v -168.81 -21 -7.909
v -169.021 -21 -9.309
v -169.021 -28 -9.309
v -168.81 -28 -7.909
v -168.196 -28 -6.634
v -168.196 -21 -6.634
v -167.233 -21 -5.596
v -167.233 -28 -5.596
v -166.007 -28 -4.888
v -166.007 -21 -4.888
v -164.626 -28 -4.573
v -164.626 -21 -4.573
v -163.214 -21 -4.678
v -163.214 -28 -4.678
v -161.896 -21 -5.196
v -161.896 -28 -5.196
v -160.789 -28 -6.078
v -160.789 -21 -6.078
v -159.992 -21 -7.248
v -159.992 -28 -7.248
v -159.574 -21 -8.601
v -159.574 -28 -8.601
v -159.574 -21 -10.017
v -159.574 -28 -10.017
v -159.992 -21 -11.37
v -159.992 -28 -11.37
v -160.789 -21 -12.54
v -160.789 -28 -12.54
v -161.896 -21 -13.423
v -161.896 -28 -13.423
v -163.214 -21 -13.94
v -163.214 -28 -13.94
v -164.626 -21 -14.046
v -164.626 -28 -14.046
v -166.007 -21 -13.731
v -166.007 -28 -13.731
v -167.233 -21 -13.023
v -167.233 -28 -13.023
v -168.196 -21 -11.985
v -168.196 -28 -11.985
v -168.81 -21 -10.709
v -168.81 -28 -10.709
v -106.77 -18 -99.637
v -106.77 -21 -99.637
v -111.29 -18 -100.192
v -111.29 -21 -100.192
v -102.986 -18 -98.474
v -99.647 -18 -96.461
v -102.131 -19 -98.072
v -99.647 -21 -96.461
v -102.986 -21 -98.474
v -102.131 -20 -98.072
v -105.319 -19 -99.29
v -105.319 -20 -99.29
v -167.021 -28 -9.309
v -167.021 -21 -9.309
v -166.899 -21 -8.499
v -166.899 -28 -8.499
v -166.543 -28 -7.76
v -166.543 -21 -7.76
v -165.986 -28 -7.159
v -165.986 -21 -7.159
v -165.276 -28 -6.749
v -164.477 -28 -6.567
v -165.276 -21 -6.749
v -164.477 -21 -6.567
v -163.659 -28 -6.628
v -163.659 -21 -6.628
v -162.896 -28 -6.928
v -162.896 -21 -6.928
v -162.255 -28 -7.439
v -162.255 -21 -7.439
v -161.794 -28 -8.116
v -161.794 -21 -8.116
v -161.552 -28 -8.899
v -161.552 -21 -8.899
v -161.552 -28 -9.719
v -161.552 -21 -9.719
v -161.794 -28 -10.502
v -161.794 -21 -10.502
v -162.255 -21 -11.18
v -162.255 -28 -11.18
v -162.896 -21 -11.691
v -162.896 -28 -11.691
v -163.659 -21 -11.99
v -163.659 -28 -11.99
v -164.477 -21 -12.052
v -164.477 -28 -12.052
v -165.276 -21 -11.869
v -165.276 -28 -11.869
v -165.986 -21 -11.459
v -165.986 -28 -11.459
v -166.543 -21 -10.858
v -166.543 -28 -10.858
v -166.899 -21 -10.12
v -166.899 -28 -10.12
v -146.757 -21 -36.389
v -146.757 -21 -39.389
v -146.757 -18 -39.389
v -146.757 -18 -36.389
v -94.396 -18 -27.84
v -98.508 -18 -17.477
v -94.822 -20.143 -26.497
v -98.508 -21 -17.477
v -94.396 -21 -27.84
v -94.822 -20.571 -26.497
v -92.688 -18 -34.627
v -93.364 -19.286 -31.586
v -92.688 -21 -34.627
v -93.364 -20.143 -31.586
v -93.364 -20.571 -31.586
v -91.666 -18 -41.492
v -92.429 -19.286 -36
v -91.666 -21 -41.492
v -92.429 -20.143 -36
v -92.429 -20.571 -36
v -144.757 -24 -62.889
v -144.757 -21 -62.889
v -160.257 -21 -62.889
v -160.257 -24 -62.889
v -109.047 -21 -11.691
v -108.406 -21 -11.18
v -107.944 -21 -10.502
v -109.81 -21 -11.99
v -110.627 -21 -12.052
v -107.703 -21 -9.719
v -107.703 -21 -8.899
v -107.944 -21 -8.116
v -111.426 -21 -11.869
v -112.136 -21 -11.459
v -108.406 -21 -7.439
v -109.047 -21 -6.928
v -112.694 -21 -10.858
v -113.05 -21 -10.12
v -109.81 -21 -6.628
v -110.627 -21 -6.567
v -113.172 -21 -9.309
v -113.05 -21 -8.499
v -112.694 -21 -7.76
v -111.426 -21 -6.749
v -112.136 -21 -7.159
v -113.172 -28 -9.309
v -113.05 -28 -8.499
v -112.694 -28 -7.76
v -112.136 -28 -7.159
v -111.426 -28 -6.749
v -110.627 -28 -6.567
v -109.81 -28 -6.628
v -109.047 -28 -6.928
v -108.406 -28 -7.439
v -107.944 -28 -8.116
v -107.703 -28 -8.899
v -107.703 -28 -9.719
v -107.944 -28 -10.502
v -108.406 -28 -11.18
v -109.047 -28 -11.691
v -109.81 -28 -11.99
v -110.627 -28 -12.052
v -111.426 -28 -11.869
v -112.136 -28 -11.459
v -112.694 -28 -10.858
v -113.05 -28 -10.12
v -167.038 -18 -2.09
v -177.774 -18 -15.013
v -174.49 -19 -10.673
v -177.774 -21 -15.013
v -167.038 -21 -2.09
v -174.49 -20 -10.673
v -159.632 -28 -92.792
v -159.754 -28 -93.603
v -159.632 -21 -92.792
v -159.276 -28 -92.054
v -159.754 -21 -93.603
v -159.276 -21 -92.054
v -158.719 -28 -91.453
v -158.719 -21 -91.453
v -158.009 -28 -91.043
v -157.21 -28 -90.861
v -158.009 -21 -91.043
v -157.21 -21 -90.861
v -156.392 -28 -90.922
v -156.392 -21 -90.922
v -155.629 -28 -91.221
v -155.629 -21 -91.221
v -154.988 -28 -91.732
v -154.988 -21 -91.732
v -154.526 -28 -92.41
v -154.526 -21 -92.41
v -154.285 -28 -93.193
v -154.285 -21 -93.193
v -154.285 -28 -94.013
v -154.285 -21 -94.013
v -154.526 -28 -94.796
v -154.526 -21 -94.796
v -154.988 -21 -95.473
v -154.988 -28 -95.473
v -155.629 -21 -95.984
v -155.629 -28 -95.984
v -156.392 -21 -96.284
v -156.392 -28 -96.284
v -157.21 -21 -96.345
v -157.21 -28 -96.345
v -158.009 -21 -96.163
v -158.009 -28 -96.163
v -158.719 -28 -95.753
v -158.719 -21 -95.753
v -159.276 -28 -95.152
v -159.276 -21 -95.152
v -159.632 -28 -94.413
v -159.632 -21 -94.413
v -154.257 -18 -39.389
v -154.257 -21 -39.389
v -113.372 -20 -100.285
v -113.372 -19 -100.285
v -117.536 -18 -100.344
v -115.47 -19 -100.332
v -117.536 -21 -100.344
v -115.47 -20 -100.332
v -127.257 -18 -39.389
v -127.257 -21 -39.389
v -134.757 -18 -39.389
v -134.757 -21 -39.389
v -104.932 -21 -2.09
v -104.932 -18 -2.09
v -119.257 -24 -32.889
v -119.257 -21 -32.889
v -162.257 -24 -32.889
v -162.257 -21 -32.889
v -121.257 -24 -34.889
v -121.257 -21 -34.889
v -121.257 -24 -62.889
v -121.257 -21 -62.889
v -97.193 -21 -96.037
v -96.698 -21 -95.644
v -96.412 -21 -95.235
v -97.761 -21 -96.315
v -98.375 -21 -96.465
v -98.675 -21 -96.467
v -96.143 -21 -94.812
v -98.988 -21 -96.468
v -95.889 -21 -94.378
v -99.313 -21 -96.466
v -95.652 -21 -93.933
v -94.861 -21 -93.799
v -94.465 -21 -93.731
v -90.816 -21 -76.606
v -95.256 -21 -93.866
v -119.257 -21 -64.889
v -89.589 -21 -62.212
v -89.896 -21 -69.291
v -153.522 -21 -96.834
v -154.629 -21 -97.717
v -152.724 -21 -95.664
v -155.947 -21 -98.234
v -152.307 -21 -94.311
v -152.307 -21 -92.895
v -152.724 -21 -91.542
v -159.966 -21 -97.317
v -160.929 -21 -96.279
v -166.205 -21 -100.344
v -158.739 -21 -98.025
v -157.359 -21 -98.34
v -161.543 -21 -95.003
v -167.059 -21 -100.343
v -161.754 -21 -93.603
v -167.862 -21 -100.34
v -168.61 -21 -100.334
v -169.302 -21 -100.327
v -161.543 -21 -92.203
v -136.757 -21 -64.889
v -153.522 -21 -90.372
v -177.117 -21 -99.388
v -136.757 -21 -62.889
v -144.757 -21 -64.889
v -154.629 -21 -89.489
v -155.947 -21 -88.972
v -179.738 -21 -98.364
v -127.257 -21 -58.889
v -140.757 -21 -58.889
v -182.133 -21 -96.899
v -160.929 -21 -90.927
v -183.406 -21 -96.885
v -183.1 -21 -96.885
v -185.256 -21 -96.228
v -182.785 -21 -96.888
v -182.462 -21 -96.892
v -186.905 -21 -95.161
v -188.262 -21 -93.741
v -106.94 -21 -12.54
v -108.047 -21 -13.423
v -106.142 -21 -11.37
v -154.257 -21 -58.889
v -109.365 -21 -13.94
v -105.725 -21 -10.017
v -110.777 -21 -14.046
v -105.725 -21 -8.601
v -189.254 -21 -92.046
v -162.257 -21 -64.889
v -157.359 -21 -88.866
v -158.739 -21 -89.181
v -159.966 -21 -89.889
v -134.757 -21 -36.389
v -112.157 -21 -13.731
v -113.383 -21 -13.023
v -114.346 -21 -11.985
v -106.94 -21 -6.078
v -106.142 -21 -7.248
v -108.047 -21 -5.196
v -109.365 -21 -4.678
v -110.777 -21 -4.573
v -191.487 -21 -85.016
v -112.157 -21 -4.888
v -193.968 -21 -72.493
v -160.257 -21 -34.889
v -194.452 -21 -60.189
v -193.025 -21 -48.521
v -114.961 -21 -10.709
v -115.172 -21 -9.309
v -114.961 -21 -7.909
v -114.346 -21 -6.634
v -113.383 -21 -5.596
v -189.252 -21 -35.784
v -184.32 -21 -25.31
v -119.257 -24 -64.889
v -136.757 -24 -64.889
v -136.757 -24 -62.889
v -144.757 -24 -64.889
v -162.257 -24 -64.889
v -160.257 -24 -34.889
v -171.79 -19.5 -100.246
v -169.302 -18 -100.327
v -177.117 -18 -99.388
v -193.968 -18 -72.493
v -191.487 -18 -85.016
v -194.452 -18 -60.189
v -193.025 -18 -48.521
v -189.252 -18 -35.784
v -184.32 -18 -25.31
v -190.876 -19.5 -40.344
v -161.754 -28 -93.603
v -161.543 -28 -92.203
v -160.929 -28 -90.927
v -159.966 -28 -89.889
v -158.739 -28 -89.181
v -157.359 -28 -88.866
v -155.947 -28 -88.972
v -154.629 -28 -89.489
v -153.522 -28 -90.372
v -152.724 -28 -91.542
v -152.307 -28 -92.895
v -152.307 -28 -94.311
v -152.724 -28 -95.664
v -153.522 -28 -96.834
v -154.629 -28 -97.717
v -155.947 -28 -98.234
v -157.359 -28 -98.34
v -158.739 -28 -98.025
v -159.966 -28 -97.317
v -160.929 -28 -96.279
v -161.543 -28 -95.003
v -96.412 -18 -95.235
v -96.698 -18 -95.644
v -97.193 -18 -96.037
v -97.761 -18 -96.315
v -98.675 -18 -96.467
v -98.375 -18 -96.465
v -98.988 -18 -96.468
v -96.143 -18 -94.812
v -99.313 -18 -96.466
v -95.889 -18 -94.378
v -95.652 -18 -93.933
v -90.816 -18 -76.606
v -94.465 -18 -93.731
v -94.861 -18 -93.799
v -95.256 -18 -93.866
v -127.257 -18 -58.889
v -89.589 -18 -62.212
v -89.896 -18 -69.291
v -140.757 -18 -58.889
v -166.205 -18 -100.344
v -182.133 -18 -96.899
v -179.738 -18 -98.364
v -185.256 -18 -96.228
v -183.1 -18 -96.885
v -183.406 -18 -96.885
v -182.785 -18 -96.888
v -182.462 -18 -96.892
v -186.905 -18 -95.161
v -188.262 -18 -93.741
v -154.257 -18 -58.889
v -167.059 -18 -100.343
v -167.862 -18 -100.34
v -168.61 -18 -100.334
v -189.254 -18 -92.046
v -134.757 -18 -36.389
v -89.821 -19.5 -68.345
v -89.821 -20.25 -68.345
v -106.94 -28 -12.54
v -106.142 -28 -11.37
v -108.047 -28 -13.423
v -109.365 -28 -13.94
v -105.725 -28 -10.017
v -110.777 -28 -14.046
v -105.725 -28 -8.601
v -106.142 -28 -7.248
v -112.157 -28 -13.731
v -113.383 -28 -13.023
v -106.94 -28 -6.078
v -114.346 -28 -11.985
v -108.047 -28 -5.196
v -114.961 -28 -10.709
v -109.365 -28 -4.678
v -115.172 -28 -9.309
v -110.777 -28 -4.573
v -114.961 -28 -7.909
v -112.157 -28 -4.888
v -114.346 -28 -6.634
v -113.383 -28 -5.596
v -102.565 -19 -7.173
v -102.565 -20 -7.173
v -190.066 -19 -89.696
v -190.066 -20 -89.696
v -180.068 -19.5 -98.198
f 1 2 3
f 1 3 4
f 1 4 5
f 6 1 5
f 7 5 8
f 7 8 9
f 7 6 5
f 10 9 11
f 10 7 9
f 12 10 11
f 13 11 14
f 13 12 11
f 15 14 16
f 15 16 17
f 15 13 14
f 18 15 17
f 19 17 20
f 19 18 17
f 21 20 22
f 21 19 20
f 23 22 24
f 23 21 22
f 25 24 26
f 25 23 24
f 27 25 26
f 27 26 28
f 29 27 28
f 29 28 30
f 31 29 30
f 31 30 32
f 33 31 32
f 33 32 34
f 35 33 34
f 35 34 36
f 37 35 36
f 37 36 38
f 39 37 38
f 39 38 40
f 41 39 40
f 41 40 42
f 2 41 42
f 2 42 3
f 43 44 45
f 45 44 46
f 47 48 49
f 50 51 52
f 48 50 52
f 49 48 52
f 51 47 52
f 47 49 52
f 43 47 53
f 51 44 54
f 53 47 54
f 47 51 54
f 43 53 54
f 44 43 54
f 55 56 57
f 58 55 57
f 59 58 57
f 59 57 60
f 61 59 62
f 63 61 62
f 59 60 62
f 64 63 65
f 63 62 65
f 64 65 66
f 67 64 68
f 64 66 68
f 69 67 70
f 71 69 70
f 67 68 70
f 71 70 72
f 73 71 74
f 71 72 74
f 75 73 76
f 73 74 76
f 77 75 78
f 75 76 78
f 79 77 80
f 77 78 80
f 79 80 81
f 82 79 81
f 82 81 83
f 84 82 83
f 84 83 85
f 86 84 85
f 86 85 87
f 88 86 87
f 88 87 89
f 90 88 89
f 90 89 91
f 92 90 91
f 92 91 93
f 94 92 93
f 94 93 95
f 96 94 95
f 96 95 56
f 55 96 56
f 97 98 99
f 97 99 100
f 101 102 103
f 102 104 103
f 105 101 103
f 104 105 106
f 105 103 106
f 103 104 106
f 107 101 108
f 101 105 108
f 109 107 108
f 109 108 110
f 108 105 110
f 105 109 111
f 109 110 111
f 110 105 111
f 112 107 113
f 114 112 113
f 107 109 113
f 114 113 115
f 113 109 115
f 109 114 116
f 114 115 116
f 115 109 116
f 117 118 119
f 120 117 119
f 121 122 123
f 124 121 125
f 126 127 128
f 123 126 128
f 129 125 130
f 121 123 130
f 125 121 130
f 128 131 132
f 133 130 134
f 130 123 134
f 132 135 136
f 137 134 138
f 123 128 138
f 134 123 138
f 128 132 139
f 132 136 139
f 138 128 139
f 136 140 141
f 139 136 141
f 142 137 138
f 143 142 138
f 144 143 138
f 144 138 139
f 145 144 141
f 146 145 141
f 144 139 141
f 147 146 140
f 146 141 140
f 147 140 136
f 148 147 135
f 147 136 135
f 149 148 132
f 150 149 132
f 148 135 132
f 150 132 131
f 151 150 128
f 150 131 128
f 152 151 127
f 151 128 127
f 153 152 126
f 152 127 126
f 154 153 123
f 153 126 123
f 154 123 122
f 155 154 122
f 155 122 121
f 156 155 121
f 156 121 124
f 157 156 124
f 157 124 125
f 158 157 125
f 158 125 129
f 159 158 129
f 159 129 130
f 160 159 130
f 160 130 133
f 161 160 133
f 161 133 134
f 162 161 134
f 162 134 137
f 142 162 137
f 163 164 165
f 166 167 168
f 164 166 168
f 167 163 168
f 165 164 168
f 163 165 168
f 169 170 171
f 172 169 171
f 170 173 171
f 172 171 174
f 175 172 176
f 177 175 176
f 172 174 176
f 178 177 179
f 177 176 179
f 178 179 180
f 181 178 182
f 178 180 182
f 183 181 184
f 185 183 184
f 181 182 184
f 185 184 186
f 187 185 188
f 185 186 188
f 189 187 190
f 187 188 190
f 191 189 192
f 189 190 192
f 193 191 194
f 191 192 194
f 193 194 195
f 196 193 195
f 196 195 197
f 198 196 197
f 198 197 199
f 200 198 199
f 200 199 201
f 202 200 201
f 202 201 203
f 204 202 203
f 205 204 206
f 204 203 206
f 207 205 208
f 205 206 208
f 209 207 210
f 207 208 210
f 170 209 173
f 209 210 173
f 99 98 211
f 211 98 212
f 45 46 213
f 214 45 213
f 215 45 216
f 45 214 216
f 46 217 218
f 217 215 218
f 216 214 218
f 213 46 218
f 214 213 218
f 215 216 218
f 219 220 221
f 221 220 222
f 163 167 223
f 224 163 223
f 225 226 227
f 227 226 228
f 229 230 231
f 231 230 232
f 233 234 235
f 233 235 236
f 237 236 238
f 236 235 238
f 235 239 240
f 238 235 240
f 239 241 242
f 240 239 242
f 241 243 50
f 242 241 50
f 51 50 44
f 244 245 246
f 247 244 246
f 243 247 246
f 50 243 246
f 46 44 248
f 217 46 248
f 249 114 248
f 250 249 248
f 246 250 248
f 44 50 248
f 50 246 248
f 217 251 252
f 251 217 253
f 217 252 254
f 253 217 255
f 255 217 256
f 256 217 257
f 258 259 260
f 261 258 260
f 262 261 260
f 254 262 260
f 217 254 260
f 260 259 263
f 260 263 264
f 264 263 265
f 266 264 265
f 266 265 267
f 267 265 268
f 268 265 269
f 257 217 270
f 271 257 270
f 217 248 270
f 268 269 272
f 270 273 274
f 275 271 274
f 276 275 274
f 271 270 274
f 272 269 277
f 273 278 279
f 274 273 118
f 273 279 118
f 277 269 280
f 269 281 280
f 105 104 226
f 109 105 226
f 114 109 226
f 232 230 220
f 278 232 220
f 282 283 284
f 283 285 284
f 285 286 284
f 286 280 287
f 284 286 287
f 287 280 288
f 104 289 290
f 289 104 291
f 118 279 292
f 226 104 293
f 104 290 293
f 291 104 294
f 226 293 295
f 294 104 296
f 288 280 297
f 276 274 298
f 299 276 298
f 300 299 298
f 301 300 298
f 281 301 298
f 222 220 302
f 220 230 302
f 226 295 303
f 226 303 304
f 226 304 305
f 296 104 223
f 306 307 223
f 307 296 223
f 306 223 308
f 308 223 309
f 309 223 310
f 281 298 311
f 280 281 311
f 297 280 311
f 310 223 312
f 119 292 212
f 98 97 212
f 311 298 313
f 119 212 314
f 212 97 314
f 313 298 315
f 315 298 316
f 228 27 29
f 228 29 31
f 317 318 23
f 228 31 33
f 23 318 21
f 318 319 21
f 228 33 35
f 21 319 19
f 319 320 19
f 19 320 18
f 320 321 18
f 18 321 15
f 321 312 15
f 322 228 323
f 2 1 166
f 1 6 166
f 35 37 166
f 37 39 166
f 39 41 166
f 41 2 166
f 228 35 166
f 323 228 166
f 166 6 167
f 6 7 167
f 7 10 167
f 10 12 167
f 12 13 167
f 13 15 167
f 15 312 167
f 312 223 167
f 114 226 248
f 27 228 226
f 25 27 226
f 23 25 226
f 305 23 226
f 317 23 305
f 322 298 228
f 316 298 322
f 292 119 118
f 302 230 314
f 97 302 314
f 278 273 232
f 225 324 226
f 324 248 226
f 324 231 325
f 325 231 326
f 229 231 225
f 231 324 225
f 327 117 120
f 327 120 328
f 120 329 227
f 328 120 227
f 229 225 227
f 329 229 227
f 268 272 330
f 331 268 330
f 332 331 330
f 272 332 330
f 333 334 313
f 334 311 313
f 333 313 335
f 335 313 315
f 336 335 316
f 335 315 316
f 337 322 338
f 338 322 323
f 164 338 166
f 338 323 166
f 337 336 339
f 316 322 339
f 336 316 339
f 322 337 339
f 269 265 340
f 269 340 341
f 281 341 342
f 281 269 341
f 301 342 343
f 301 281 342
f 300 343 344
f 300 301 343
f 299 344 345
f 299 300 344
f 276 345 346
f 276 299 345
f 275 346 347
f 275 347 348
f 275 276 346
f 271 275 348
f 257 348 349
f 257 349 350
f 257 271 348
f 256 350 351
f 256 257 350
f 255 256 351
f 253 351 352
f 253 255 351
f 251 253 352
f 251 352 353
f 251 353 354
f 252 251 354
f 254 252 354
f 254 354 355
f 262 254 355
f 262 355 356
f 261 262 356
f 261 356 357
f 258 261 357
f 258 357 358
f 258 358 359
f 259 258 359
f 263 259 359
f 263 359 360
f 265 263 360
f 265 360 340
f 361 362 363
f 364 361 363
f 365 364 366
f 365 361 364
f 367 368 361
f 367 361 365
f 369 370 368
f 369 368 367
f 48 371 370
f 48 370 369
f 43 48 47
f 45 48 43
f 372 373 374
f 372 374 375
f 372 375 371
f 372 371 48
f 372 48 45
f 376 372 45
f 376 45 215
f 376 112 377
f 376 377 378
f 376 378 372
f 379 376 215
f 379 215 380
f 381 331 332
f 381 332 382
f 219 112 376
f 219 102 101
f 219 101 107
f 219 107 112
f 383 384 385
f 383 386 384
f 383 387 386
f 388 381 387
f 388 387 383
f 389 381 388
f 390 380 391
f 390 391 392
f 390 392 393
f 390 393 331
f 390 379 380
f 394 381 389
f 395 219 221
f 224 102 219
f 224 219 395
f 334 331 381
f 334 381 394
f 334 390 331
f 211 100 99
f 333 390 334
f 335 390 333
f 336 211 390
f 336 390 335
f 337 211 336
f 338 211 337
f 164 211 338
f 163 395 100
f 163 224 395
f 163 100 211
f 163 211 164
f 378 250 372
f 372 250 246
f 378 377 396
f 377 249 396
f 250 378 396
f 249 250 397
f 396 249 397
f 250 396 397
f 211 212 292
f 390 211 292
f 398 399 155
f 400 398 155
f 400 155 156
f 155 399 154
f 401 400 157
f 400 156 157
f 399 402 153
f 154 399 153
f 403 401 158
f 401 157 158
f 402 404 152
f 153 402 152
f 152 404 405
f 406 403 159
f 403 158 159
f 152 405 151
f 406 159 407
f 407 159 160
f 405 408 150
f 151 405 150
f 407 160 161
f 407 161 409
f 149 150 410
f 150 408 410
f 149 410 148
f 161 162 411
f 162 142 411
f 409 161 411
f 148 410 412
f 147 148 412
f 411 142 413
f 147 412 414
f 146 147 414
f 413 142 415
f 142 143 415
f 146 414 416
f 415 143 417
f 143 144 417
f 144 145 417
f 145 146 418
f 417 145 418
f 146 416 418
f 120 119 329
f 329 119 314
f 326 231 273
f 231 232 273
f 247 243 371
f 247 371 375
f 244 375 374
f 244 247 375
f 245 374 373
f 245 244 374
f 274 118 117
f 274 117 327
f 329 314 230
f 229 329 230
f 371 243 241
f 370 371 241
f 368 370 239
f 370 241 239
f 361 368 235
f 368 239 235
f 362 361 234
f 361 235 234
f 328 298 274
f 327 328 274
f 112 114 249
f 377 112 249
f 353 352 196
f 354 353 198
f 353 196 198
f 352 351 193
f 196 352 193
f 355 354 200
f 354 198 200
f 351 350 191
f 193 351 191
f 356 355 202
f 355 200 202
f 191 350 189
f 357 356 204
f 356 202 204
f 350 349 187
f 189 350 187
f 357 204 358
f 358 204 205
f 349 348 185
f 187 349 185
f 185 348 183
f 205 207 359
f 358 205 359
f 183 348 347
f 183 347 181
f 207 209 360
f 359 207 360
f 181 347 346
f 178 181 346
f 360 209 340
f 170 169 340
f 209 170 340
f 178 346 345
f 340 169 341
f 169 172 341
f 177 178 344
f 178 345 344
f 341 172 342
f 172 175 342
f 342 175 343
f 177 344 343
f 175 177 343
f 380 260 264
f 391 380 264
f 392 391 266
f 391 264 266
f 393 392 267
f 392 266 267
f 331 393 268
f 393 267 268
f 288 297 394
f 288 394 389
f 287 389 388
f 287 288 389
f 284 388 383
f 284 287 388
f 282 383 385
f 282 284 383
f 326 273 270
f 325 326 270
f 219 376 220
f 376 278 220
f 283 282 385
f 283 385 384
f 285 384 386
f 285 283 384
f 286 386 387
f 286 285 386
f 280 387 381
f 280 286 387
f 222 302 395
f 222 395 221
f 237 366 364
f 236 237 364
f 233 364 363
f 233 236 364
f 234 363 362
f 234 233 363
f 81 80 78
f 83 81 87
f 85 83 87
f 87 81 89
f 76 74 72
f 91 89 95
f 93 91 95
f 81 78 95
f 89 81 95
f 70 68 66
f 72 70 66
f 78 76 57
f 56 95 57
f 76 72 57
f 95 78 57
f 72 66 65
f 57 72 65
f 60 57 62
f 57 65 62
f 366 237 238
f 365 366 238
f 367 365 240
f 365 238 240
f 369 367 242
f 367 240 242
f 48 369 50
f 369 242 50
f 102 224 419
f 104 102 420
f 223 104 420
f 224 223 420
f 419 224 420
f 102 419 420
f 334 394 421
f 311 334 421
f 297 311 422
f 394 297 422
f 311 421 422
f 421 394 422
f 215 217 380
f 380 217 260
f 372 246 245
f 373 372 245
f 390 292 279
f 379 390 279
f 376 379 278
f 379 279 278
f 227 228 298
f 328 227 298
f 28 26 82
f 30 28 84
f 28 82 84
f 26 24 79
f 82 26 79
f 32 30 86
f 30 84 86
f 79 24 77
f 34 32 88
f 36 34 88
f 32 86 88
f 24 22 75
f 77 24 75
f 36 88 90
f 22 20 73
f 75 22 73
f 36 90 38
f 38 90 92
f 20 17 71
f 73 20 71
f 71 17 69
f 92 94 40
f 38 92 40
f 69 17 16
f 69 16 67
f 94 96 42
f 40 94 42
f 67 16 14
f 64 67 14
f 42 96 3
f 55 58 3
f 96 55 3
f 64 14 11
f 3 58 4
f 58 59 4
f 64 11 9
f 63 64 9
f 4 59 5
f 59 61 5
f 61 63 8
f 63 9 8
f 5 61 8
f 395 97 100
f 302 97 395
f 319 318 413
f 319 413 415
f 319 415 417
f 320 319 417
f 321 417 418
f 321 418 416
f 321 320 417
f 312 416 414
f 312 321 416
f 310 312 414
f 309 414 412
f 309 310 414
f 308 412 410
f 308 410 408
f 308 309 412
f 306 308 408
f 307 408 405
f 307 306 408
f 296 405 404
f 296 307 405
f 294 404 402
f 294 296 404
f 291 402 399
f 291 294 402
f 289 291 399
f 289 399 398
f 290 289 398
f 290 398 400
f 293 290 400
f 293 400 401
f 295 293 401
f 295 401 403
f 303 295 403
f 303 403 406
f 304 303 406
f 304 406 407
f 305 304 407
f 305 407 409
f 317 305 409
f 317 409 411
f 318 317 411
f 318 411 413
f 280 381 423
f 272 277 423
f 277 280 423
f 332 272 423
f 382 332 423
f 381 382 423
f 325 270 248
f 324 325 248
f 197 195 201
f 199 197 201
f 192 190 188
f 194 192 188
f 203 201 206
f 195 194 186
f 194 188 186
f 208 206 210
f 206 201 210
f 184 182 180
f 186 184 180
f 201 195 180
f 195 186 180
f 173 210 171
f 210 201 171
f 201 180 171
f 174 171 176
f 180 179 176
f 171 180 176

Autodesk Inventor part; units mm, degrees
ref_plane "YZ Plane" through (0, 0, 0) normal (1, 0, 0) x (0, 1, 0)
ref_plane "XY Plane" through (0, 0, 0) normal (0, 0, 1) x (1, 0, 0)
ref_plane "작업 평면16" through (0, -21, 0) normal (0, 1, 0) x (-1, 0, 0)
sketch "스케치46" plane through (0, -21, 0) normal (0, 1, 0) x (-1, 0, 0)
  spline S0 degree 3 poles (191.4874, -85.0161) (195.7231, -69.6387) (195.5194, -54.7481) (188.0983, -31.7262) (183.731, -23.2823) (177.7743, -15.0127) knots 0.143885 0.143885 0.143885 0.143885 0.581431 0.581431 0.843231 0.843231 0.843231 0.843231
  spline S1 degree 3 poles (189.2538, -92.0465) (190.1005, -89.6919) (190.845, -87.3484) (191.4874, -85.0161) knots 0.077523 0.077523 0.077523 0.077523 0.143885 0.143885 0.143885 0.143885
  arc A0 (183.4058, -96.885) -> (189.2538, -92.0465) centre (181.526, -88.6596) ccw
  spline S2 degree 3 poles (177.1168, -99.3875) (178.1345, -99.0781) (179.1243, -98.6874) (180.7924, -97.822) (181.4844, -97.3903) (182.1335, -96.8989) knots -0.627135 -0.627135 -0.627135 -0.627135 -0.308629 -0.308629 -0.063964 -0.063964 -0.063964 -0.063964
  ellipse E0 centre (180.8973, -97.418) end of major axis (175.52, -97.6575) minor radius 0.4767 (183.4058, -96.885) -> (182.1335, -96.8989) ccw
  spline S3 degree 3 poles (169.3014, -100.3265) (170.1206, -100.3155) (170.9637, -100.2934) (173.5928, -100.1416) (175.3872, -99.9134) (177.1168, -99.3875) knots -0.790866 -0.790866 -0.790866 -0.790866 -0.54231 -0.54231 0 0 0 0
  ellipse E1 centre (154.0427, -99.7705) end of major axis (172.6036, -100.1468) minor radius 0.4335 (166.2054, -100.3445) -> (169.3014, -100.3265) ccw
  line L0 (117.5358, -100.3445) -> (166.2054, -100.3445)
  spline S4 degree 3 poles (177.7743, -15.0127) (174.6367, -10.6567) (171.058, -6.3491) (167.0384, -2.0899) knots 0.843231 0.843231 0.843231 0.843231 0.981134 0.981134 0.981134 0.981134
  line L1 (167.0384, -2.0899) -> (104.9322, -2.0899)
  spline S5 degree 3 poles (104.9322, -2.0899) (102.452, -7.1506) (100.3104, -12.2796) (98.5075, -17.477) knots 0.836147 0.836147 0.836147 0.836147 1 1 1 1
  spline S6 degree 3 poles (98.5075, -17.477) (97.9178, -18.6748) (97.3597, -19.8935) (96.0924, -22.888) (95.4222, -24.6714) (94.4856, -27.5216) (94.1741, -28.5502) (93.7016, -30.2529) (93.5277, -30.9181) (93.2089, -32.2157) (93.0634, -32.8461) (92.745, -34.3177) (92.5794, -35.1581) (92.103, -37.8278) (91.8501, -39.6604) (91.6665, -41.4919) knots -2.526004 -2.526004 -2.526004 -2.526004 -2.120534 -2.120534 -1.544298 -1.544298 -1.220936 -1.220936 -1.014307 -1.014307 -0.819565 -0.819565 -0.560995 -0.560995 0 0 0 0
  line L2 (91.6665, -41.4919) -> (89.5894, -62.2122)
  spline S7 degree 3 poles (89.5894, -62.2122) (89.5894, -63.3351) (89.6133, -64.4561) (89.6986, -66.503) (89.7523, -67.4237) (89.8984, -69.389) (89.9946, -70.4286) (90.2978, -73.1917) (90.5351, -74.9036) (90.8157, -76.6062) knots -1.44821 -1.44821 -1.44821 -1.44821 -1.11115 -1.11115 -0.834292 -0.834292 -0.520567 -0.520567 0 0 0 0
  line L3 (90.8157, -76.6062) -> (94.465, -93.7314)
  arc A1 (94.465, -93.7314) -> (95.652, -93.9327) centre (165.2915, 320.1429) ccw
  ellipse E2 centre (105.5879, -87.8445) end of major axis (105.5879, -100.3445) minor radius 11.3766 (95.652, -93.9327) -> (96.6978, -95.6442) ccw
  arc A2 (96.6978, -95.6442) -> (98.3748, -96.4646) centre (98.7561, -93.561) ccw
  ellipse E3 centre (102.6075, -95.7007) end of major axis (109.3466, -95.2724) minor radius 0.6378 (98.3748, -96.4646) -> (99.6471, -96.4613) ccw
  spline S8 degree 3 poles (99.6471, -96.4613) (100.4112, -97.0879) (101.245, -97.6223) (103.148, -98.5885) (104.2178, -98.9855) (107.048, -99.7682) (109.0052, -100.0586) (111.2899, -100.1922) knots -1.504226 -1.504226 -1.504226 -1.504226 -1.123667 -1.123667 -0.686597 -0.686597 0 0 0 0
  spline S9 degree 3 poles (111.2899, -100.1922) (113.3488, -100.3126) (115.5027, -100.3445) (117.5358, -100.3445) knots -0.609915 -0.609915 -0.609915 -0.609915 0 0 0 0
  line L4 (117.5358, -100.3445) -> (166.2054, -100.3445)
  ellipse E4 centre (154.0427, -99.7705) end of major axis (172.6036, -100.1468) minor radius 0.4335 (166.2054, -100.3445) -> (169.3014, -100.3265) ccw
  spline S10 degree 3 poles (169.3014, -100.3265) (170.1206, -100.3155) (170.9637, -100.2934) (173.5928, -100.1416) (175.3872, -99.9134) (177.1168, -99.3875) knots -0.790866 -0.790866 -0.790866 -0.790866 -0.54231 -0.54231 0 0 0 0
  spline S11 degree 3 poles (177.1168, -99.3875) (178.1345, -99.0781) (179.1243, -98.6874) (180.7924, -97.822) (181.4844, -97.3903) (182.1335, -96.8989) knots -0.627135 -0.627135 -0.627135 -0.627135 -0.308629 -0.308629 -0.063964 -0.063964 -0.063964 -0.063964
  ellipse E5 centre (180.8973, -97.418) end of major axis (175.52, -97.6575) minor radius 0.4767 (183.4058, -96.885) -> (182.1335, -96.8989) ccw
  arc A3 (183.4058, -96.885) -> (189.2538, -92.0465) centre (181.526, -88.6596) ccw
  spline S12 degree 3 poles (189.2538, -92.0465) (190.1005, -89.6919) (190.845, -87.3484) (191.4874, -85.0161) knots 0.077523 0.077523 0.077523 0.077523 0.143885 0.143885 0.143885 0.143885
  spline S13 degree 3 poles (191.4874, -85.0161) (195.7231, -69.6387) (195.5194, -54.7481) (188.0983, -31.7262) (183.731, -23.2823) (177.7743, -15.0127) knots 0.143885 0.143885 0.143885 0.143885 0.581431 0.581431 0.843231 0.843231 0.843231 0.843231
  spline S14 degree 3 poles (189.5592, -84.485) (189.4545, -84.8653) (189.2663, -85.5314) (189.0415, -86.2939) (188.8686, -86.8664) (188.7513, -87.2483) (188.602, -87.7261) (188.4805, -88.1086) (188.326, -88.587) (188.2003, -88.9701) (188.0405, -89.4492) (187.9106, -89.8328) (187.7456, -90.3127) (187.5779, -90.7929) (187.441, -91.1774) (187.3718, -91.3698) knots 0.077523 0.077523 0.077523 0.077523 0.088583 0.096878 0.099644 0.105174 0.107939 0.113469 0.116234 0.121764 0.124529 0.130059 0.132824 0.138354 0.143885 0.143885 0.143885 0.143885
  arc A4 (180.8973, -95.3262) -> (187.3718, -91.3698) centre (181.2393, -88.61) ccw
  spline S15 degree 3 poles (180.8973, -95.3262) (180.6943, -95.4789) (180.3216, -95.7405) (179.8747, -96.018) (179.5233, -96.221) (179.2849, -96.3513) (178.9819, -96.5081) (178.7361, -96.6283) (178.4248, -96.7723) (178.1725, -96.8825) (177.8532, -97.0141) (177.5947, -97.1146) (177.268, -97.2343) (176.9377, -97.3481) (176.6698, -97.433) (176.535, -97.474) knots -0.622898 -0.622898 -0.622898 -0.622898 -0.533273 -0.462877 -0.439411 -0.39248 -0.369015 -0.322084 -0.298619 -0.251688 -0.228222 -0.181292 -0.157826 -0.110895 -0.063964 -0.063964 -0.063964 -0.063964
  line L5 (176.535, -97.474) -> (111.4067, -98.1956)
  spline S16 degree 3 poles (111.4067, -98.1956) (111.0082, -98.1723) (110.2355, -98.1159) (109.3273, -98.0206) (108.4602, -97.9064) (107.7985, -97.7999) (107.0879, -97.6629) (106.6323, -97.562) (106.2272, -97.4625) (106.0103, -97.4058) (105.7968, -97.3472) (105.6552, -97.307) (105.3736, -97.224) (105.0254, -97.1142) (104.5121, -96.935) (104.1099, -96.7784) (103.7148, -96.6109) (103.455, -96.4936) (103.1348, -96.3398) (102.8824, -96.2109) (102.573, -96.043) (102.3302, -95.9032) (101.9734, -95.685) (101.5109, -95.3793) (101.1273, -95.0886) (100.9153, -94.9147) knots 0 0 0 0 0.125352 0.250704 0.31338 0.438733 0.501409 0.595423 0.626761 0.673768 0.689437 0.720775 0.736444 0.814789 0.877465 0.971479 1.002817 1.065493 1.096832 1.159508 1.190846 1.253522 1.28486 1.378874 1.504226 1.504226 1.504226 1.504226
  arc A5 (96.293, -91.0501) -> (100.9153, -94.9147) centre (102.2083, -88.6716) ccw
  arc A6 (92.3068, -61.3872) -> (96.293, -91.0501) centre (227.7562, -58.2846) ccw
  arc A7 (107.3313, -4.0899) -> (92.3068, -61.3872) centre (218.4178, -63.8374) ccw
  line L6 (107.3313, -4.0899) -> (166.1723, -4.0899)
  spline S17 degree 3 poles (166.1723, -4.0899) (166.7932, -4.7558) (167.8603, -5.9228) (169.041, -7.2601) (169.91, -8.2645) (170.4809, -8.9348) (171.1843, -9.7736) (171.7386, -10.4454) (172.4212, -11.286) (172.959, -11.9593) (173.6208, -12.8017) (174.142, -13.4764) (174.7831, -14.3207) (175.4139, -15.1658) (175.9075, -15.8429) (176.1515, -16.1817) knots 0.843231 0.843231 0.843231 0.843231 0.865071 0.881452 0.886912 0.897832 0.903292 0.914212 0.919672 0.930592 0.936052 0.946972 0.952432 0.963352 0.974272 0.974272 0.974272 0.974272
  spline S18 degree 3 poles (176.1515, -16.1817) (177.4538, -17.9897) (179.9013, -21.6192) (182.5692, -26.1898) (184.9446, -30.7857) (186.6116, -34.4828) (188.4049, -39.1304) (189.6076, -42.8697) (190.8225, -47.5717) (191.5638, -51.3563) (192.2029, -56.1175) (192.4844, -59.9515) (192.5489, -64.7775) (192.3706, -68.6656) (191.8595, -73.5618) (191.0598, -78.4947) (190.1111, -82.4814) (189.5592, -84.485) knots 0.143885 0.143885 0.143885 0.143885 0.202163 0.260442 0.289582 0.347861 0.377 0.435279 0.464418 0.522697 0.551837 0.610116 0.639255 0.697534 0.726673 0.784952 0.843231 0.843231 0.843231 0.843231
  circle A8 centre (157.0041, -93.6029) radius 2.75
  circle A9 centre (157.0041, -93.6029) radius 4.75
  line L7 (176.535, -97.474) -> (111.4067, -98.1956)
  circle A10 centre (164.2713, -9.3093) radius 2.75
  circle A11 centre (164.2713, -9.3093) radius 4.75
  circle A12 centre (110.4218, -9.3093) radius 2.75
  circle A13 centre (110.4218, -9.3093) radius 4.75
  line L8 (154.2569, -58.8887) -> (127.2569, -58.8887)
  line L9 (127.2569, -58.8887) -> (127.2569, -39.3887)
  line L10 (154.2569, -39.3887) -> (154.2569, -58.8887)
  line L11 (146.7569, -39.3887) -> (146.7569, -36.3887)
  line L12 (146.7569, -36.3887) -> (134.7569, -36.3887)
  line L13 (134.7569, -36.3887) -> (134.7569, -39.3887)
  line L14 (127.2569, -39.3887) -> (134.7569, -39.3887)
  line L15 (146.7569, -39.3887) -> (154.2569, -39.3887)
  line L16 (121.2569, -62.8887) -> (160.2569, -62.8887)
  line L17 (160.2569, -62.8887) -> (160.2569, -34.8887)
  line L18 (160.2569, -34.8887) -> (121.2569, -34.8887)
  line L19 (121.2569, -34.8887) -> (121.2569, -62.8887)
  line L20 (162.2569, -64.8887) -> (119.2569, -64.8887)
  line L21 (119.2569, -64.8887) -> (119.2569, -32.8887)
  line L22 (119.2569, -32.8887) -> (162.2569, -32.8887)
  line L23 (162.2569, -32.8887) -> (162.2569, -64.8887)
  line L24 (136.7569, -62.8887) -> (136.7569, -64.8887)
  line L25 (144.7569, -62.8887) -> (144.7569, -64.8887)
  line L26 (140.7569, -58.8887) -> (140.7569, -78.8674)
  point P0 (0, 0)
  point P1 (135.3739, -0.3445)
  point P2 (177.7743, -15.0127)
  point P3 (159.4693, -97.6631)
  point P4 (154.6295, -97.7167)
  dimension "d272" = 5.5
  dimension "d273" = 2
  dimension "d274" = 5.5
  dimension "d275" = 2
  dimension "d276" = 5.5
  dimension "d277" = 2
  dimension "d284" = 27
  dimension "d285" = 19.5
  dimension "d286" = 12
  dimension "d287" = 7.5
  dimension "d288" = 3
  dimension "d291" = 3
  dimension "d292" = 39
  dimension "d293" = 28
  dimension "d294" = 6
  dimension "d295" = 4
  dimension "d296" = 2
  dimension "d297" = 4
  dimension "d298" = 4
extrude "돌출51" add sketch "스케치46" along normal blind 3 contours S1 A0 E0 S2 S3 E1 L0 S9 S8 E3 A2 E2 A1 L3 S7 L2 S6 S5 L1 S4 S0 | S14 A4 S15 L5 A9 S16 A5 A6 A7 L6 S17 S18 | A9 L5 | L5 A9 | A8 | A10 | A11 | A12 | A13 | L16 L19 L18 L17 | L16 L25 L20 L26 | L26 L20 L24 L16 | L8 L9 L14 L13 L12 L11 L15 L10 | L24 L20 L21 L22 L23 L25 L16 L17 L18 L19
extrude "돌출53" add sketch "스케치46" against normal blind 7 contours A9 L5 | L5 A9 | A11 | A13
extrude "돌출54" cut sketch "스케치46" along normal blind 7 contours L8 L9 L14 L13 L12 L11 L15 L10
extrude "돌출55" add sketch "스케치46" against normal blind 3 contours L24 L20 L21 L22 L23 L25 L16 L17 L18 L19
properties part number "장갑_위_찐"
